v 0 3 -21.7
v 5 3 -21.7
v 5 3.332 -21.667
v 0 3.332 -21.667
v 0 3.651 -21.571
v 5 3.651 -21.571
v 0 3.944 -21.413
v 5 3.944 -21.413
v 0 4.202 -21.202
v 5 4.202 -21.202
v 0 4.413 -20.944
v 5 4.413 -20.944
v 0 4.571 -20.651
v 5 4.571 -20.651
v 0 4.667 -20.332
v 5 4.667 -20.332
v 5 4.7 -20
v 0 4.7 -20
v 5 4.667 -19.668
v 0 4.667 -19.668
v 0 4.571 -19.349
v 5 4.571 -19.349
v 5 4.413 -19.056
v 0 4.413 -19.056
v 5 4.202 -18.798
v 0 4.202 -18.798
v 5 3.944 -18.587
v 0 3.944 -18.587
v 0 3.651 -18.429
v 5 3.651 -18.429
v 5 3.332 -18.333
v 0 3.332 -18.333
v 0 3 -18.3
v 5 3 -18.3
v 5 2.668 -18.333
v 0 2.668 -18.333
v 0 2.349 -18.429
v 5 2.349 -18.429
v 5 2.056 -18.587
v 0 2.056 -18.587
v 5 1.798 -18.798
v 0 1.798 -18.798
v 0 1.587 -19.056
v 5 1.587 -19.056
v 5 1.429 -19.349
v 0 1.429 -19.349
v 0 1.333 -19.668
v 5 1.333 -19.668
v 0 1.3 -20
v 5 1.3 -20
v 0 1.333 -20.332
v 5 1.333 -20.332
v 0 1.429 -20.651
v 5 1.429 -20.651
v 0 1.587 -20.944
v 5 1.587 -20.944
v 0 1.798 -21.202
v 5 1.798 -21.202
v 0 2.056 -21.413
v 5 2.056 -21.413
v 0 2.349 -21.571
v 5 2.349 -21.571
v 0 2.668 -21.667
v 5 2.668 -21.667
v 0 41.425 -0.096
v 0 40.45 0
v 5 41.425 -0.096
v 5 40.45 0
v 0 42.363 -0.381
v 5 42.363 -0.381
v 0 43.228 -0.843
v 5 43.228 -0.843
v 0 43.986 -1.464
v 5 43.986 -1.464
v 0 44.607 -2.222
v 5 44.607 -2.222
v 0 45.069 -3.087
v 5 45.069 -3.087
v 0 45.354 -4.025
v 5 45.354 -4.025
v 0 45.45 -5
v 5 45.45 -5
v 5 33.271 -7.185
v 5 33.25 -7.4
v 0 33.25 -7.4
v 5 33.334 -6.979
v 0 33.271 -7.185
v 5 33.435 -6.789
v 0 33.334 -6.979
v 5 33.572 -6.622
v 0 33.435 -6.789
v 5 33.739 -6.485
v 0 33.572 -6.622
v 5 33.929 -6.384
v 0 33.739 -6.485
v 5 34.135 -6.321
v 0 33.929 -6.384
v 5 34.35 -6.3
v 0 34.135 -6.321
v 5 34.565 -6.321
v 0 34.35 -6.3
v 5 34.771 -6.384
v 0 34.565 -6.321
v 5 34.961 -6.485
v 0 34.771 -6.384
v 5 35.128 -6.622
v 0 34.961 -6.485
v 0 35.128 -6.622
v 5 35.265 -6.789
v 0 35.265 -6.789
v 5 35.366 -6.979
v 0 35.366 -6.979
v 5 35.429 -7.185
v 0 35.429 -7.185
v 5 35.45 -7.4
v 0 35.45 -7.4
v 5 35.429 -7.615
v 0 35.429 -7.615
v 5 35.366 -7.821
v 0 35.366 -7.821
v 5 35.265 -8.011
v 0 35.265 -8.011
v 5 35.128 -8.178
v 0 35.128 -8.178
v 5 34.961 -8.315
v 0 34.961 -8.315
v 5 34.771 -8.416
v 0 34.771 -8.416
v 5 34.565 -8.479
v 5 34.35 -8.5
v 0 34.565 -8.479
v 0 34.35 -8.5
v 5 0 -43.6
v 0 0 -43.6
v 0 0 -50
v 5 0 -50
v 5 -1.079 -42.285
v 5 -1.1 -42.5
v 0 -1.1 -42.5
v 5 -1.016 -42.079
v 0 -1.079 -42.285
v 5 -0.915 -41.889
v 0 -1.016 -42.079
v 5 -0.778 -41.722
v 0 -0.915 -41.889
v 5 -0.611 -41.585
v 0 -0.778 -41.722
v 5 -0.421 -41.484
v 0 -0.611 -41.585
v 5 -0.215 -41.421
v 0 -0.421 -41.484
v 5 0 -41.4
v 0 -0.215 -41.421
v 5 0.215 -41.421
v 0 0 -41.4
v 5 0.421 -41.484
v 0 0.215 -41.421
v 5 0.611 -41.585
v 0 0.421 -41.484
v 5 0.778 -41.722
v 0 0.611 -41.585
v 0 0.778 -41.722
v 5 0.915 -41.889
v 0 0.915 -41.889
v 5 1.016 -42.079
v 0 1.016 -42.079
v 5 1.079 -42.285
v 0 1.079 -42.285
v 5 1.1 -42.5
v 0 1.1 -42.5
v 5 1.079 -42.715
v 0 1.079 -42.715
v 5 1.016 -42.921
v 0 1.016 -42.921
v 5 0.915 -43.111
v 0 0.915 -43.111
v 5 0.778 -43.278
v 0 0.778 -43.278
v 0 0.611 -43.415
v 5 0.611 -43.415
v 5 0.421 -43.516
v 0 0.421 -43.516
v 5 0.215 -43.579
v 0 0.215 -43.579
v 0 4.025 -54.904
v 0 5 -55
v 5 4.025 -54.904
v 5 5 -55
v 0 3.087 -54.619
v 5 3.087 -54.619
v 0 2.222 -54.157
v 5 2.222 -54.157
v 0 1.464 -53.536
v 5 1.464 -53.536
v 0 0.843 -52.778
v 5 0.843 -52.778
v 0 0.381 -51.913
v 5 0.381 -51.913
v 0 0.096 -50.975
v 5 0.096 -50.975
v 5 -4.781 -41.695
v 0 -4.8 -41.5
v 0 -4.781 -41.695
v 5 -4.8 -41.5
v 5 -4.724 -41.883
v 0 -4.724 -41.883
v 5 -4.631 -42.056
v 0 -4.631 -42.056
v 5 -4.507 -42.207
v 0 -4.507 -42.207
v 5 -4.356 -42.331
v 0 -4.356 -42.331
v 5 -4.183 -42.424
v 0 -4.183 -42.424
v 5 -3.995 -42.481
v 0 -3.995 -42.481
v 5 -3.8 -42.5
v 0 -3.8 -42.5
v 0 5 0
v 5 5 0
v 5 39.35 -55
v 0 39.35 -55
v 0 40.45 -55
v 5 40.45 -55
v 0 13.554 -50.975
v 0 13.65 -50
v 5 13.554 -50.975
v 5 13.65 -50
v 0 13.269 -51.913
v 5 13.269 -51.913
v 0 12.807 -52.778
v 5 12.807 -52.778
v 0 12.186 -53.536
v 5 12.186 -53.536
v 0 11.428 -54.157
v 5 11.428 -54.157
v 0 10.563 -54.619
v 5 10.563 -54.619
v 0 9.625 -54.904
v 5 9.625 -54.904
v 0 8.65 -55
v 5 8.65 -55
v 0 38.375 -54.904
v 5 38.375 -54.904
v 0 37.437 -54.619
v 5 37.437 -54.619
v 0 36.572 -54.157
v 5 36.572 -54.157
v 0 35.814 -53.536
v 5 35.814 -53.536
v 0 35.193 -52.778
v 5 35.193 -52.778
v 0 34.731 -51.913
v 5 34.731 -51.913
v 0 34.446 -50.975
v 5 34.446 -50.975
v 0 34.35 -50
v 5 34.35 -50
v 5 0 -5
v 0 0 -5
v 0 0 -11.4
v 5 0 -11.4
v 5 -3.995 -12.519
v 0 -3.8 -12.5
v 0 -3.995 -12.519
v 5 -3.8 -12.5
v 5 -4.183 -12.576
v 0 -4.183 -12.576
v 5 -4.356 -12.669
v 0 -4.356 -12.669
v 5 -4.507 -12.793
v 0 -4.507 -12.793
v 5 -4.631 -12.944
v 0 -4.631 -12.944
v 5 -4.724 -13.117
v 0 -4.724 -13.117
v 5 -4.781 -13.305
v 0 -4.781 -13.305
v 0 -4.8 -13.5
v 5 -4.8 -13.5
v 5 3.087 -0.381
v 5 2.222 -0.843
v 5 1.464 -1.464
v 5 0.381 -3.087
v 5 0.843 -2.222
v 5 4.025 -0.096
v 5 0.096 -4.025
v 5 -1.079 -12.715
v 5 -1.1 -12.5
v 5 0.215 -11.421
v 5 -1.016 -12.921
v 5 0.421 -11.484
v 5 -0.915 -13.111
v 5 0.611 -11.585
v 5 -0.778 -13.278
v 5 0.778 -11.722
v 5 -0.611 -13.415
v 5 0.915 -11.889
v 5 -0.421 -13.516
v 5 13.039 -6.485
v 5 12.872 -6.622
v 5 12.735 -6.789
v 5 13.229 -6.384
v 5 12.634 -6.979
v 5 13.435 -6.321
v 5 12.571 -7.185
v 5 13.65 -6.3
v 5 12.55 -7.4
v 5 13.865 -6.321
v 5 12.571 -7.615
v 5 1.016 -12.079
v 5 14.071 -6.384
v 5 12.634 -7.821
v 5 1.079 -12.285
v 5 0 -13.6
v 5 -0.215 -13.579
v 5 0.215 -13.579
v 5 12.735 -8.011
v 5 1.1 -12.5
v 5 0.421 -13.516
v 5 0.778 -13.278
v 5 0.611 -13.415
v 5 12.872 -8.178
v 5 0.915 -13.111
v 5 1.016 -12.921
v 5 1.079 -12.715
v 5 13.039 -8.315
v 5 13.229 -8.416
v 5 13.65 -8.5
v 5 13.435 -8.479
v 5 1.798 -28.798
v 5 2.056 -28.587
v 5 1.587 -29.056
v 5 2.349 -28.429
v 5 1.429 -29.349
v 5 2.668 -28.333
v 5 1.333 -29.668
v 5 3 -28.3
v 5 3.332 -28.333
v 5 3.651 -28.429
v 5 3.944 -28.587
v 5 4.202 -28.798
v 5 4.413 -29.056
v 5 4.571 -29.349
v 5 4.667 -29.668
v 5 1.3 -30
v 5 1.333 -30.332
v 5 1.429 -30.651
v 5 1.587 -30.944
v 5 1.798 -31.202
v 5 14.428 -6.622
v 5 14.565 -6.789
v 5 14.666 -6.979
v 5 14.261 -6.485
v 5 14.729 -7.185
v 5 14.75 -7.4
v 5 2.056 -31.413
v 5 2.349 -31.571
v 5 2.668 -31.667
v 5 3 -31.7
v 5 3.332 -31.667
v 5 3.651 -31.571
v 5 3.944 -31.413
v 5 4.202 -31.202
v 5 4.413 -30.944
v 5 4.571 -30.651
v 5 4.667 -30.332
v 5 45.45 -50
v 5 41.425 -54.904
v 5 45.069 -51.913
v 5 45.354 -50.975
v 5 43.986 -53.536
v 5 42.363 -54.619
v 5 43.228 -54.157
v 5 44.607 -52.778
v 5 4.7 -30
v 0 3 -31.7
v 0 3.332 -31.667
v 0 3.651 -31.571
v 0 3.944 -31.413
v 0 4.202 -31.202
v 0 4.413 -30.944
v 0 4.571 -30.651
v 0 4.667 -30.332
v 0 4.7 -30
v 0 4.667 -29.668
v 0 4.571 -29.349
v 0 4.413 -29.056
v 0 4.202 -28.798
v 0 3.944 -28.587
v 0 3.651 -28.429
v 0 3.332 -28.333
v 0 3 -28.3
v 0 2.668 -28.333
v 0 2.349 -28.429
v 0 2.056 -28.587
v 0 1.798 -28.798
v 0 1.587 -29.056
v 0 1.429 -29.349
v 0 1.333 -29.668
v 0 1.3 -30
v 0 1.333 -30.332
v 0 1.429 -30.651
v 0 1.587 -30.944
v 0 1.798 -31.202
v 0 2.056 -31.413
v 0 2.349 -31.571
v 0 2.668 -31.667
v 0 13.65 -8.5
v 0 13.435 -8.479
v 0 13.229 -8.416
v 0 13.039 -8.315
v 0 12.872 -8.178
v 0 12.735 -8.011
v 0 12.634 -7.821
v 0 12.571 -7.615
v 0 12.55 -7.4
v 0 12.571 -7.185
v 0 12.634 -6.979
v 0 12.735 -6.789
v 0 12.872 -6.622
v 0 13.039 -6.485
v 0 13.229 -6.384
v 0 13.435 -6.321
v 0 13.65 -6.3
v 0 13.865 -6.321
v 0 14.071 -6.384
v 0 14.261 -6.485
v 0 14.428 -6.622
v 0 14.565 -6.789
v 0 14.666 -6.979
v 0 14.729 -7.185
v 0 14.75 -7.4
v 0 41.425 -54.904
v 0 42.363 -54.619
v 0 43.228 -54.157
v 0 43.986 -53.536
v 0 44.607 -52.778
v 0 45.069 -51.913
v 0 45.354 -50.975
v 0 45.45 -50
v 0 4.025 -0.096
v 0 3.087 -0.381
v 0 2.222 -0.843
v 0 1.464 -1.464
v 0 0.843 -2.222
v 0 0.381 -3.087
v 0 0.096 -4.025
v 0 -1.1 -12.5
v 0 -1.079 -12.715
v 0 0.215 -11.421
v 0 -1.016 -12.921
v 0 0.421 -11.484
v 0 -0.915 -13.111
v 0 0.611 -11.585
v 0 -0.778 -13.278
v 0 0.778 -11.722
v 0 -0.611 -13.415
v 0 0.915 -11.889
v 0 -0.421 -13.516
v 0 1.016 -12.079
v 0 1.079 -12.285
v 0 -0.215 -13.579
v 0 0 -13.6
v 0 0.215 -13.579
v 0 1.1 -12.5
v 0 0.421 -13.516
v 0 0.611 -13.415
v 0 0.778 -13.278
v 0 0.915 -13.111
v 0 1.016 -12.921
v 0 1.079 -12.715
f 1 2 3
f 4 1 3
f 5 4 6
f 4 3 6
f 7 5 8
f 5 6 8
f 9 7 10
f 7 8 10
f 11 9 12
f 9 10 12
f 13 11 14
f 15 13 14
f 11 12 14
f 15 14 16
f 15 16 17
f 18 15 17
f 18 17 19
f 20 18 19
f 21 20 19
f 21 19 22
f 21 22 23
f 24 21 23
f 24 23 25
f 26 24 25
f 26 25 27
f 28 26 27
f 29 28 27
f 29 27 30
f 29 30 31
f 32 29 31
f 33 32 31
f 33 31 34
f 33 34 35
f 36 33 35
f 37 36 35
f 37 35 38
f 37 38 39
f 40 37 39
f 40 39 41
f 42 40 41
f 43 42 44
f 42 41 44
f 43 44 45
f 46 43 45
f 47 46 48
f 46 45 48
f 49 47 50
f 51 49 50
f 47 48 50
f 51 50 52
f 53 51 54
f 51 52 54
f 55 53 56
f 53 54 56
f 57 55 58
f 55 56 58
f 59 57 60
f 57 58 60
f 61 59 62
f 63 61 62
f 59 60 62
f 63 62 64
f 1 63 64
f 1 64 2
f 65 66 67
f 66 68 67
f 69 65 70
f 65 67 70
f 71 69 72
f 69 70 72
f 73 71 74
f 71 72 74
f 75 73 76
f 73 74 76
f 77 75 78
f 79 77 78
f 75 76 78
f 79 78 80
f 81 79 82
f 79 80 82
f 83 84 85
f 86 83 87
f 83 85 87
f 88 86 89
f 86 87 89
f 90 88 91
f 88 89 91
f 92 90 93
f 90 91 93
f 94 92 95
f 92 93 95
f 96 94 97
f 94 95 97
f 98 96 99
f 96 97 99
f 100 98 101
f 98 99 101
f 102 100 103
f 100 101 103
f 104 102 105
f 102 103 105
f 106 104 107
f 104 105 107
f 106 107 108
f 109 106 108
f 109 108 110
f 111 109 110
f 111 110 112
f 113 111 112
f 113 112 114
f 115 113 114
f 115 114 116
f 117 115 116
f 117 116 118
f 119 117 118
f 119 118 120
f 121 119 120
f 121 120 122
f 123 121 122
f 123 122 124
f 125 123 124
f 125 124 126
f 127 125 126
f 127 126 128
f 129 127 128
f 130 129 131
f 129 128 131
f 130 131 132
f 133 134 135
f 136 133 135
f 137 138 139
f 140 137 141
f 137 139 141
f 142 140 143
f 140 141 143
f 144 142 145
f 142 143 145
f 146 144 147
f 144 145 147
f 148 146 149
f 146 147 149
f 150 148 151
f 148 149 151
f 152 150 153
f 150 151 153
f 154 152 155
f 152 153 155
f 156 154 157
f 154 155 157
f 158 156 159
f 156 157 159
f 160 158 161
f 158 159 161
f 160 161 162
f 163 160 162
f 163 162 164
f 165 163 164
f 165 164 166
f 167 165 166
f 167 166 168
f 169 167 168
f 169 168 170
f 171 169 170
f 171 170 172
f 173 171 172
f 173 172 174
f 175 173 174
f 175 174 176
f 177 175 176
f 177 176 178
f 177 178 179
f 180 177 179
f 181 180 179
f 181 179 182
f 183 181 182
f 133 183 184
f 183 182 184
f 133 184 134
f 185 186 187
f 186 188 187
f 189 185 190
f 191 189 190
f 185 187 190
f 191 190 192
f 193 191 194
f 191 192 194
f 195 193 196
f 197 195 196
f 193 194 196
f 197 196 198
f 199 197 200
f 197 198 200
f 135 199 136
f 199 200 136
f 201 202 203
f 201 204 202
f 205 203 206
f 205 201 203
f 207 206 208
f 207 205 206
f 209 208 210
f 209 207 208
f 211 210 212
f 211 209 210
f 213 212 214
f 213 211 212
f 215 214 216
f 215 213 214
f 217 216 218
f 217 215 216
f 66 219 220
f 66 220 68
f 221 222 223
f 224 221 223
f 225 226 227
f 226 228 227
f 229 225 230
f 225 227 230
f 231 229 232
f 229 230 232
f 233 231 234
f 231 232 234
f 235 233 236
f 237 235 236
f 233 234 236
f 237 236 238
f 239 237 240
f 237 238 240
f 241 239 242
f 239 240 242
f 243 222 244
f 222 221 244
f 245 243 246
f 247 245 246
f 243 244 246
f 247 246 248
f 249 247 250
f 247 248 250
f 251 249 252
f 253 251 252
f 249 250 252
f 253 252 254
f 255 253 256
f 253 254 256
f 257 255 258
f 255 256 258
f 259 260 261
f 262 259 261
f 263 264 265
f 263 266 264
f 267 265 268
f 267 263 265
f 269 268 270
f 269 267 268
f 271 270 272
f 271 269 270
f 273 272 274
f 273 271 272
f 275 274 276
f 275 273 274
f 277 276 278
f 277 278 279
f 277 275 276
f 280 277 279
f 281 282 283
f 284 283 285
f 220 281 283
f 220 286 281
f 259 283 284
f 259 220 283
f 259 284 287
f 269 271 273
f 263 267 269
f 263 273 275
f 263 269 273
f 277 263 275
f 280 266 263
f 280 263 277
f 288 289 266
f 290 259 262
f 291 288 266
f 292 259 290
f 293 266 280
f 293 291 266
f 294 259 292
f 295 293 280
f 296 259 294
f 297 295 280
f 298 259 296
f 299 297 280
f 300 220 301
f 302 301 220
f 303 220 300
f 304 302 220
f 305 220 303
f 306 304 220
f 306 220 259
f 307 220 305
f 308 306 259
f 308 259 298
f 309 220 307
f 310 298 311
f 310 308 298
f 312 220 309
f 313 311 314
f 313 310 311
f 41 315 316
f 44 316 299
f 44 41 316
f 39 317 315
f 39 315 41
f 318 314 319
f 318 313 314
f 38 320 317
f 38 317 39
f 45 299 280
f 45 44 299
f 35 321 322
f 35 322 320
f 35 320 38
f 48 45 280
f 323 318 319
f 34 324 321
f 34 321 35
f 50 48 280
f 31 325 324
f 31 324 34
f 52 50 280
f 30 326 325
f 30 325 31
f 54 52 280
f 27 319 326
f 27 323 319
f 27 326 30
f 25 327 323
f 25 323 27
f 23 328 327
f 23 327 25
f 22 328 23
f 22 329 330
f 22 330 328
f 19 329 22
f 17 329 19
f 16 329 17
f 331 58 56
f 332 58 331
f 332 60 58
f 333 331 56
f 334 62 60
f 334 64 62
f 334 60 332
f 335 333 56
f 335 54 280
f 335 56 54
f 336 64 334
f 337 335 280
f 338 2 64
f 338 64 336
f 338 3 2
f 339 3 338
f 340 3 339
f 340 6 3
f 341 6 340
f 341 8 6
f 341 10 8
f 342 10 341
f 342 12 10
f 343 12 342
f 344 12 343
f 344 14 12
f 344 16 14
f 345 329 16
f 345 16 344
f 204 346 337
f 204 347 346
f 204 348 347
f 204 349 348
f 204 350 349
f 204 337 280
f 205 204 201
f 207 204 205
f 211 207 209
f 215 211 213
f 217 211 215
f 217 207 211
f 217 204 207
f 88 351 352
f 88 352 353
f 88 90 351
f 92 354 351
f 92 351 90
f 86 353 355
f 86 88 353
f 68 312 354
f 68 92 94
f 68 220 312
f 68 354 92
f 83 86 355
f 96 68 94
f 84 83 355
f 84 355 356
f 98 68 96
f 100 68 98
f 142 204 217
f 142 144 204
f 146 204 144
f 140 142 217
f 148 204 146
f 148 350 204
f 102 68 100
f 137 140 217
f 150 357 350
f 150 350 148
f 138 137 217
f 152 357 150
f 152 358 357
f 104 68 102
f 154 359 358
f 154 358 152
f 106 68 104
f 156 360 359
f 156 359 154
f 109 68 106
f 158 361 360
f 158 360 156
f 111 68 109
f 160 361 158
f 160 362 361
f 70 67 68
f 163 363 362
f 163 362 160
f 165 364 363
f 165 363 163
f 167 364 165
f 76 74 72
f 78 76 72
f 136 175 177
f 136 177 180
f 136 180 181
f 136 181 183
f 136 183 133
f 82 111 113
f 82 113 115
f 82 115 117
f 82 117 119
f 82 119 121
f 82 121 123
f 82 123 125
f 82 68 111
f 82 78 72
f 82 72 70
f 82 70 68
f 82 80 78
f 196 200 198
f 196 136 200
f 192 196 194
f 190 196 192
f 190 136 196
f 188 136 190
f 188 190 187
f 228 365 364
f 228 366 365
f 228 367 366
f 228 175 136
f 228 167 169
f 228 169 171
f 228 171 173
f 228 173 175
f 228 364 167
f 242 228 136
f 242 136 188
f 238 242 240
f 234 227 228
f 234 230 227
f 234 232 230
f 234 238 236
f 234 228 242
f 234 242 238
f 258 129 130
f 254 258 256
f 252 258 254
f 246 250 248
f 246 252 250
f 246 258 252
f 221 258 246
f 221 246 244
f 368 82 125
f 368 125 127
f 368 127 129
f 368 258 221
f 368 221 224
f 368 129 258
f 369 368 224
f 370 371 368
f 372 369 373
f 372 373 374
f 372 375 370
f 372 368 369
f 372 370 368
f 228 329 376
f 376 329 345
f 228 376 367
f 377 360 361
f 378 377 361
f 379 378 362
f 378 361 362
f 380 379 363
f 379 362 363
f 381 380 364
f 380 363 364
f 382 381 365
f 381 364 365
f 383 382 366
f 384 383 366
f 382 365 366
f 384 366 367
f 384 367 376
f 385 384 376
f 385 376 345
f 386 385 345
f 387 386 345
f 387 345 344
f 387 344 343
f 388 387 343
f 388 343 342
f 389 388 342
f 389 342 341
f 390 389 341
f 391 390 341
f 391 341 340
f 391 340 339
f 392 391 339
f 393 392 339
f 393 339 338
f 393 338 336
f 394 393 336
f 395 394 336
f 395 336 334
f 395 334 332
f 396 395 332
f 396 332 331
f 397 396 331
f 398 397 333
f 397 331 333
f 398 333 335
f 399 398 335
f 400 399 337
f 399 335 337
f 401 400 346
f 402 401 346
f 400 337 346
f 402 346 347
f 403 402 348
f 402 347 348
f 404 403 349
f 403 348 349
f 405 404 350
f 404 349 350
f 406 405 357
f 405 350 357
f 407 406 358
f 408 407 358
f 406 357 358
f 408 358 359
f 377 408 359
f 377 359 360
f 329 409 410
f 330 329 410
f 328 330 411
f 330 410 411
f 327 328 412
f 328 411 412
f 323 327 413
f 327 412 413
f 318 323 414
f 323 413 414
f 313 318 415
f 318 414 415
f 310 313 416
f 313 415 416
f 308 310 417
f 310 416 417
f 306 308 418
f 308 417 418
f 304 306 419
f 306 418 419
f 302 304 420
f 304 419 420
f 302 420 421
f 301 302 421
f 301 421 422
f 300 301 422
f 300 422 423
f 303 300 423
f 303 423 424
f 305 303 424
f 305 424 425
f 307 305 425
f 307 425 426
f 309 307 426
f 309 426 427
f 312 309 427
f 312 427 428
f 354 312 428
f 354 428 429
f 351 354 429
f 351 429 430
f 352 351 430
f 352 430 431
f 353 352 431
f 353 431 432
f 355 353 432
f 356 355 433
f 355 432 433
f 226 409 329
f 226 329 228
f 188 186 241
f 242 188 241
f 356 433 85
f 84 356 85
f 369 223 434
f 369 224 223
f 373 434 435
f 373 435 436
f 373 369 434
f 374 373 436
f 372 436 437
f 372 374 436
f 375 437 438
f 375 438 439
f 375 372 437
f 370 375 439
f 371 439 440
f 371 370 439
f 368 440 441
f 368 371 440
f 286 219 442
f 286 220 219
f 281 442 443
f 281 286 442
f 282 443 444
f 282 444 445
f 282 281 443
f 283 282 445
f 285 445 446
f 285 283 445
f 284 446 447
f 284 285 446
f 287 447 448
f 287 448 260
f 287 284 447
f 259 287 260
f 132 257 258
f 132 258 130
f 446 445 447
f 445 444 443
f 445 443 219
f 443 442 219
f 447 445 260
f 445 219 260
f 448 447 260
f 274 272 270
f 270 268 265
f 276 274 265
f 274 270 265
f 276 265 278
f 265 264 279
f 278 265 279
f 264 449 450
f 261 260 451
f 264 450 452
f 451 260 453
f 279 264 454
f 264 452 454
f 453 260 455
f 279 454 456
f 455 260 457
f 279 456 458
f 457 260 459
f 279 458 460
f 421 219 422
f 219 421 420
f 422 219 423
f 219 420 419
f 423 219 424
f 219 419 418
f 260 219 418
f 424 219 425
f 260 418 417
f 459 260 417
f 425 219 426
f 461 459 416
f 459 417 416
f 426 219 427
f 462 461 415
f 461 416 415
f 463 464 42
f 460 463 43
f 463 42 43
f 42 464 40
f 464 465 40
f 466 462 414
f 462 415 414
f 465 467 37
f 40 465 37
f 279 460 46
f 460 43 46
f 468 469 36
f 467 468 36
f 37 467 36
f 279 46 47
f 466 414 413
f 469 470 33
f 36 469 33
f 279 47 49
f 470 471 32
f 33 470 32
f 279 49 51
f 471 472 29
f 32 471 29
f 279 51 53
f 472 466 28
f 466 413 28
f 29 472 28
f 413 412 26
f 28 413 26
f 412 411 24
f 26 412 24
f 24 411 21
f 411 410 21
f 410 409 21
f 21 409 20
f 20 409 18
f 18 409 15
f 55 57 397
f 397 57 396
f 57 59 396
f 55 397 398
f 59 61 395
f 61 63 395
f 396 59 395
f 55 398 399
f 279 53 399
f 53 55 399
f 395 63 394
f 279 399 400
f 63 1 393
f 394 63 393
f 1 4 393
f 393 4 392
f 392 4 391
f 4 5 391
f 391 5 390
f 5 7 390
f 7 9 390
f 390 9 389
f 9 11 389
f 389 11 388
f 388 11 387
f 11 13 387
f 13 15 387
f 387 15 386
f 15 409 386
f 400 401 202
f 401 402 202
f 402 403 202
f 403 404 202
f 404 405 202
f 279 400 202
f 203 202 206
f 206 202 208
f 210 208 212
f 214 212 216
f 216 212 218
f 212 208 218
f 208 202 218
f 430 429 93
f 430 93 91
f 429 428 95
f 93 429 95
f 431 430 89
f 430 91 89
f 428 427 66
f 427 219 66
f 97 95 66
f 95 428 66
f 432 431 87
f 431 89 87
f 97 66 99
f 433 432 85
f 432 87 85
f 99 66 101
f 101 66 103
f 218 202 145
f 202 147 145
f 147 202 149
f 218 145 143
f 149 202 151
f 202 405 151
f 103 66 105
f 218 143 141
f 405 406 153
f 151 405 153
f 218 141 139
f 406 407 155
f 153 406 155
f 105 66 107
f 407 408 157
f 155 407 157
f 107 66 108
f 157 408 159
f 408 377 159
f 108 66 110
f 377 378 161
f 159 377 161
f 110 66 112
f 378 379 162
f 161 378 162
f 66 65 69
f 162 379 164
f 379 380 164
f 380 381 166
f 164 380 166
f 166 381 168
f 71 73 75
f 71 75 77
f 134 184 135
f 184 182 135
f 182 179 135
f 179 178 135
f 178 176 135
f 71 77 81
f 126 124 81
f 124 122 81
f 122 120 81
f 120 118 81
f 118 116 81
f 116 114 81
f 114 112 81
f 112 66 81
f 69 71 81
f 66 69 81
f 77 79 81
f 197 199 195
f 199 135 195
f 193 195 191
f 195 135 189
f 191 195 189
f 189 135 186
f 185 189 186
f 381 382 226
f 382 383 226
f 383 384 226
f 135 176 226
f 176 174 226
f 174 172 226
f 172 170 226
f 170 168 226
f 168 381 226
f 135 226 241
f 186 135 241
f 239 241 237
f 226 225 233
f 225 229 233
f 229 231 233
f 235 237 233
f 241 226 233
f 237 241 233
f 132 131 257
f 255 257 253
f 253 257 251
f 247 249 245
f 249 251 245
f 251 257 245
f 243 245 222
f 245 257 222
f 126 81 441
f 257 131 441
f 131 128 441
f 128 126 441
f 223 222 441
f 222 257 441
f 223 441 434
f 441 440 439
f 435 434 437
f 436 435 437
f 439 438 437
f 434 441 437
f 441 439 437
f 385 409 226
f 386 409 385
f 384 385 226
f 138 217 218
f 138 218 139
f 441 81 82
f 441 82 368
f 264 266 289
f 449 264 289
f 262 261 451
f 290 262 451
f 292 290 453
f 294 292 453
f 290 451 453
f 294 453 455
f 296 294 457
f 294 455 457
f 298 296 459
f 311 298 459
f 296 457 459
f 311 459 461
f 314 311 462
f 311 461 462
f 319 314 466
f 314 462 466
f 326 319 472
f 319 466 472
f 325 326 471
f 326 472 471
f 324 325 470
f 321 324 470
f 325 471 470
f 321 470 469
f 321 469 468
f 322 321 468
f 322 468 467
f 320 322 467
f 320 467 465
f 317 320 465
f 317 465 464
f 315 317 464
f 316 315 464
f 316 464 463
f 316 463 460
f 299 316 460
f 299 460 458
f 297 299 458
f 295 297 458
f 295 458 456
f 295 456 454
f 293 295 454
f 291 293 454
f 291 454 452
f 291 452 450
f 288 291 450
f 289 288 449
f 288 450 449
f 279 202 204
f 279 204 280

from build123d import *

# Parameters (mm, degrees)
SKETCH_1_W           = 55
SKETCH_1_H           = 45.45
SKETCH_1_W_2         = 40.2
SKETCH_1_H_2         = 20.7
EXTRUDE_1_DEPTH      = 5
SKETCH_2_W           = 30
SKETCH_2_H           = 4.8
EXTRUDE_2_DEPTH      = 5
SKETCH_3_R           = 1.1
CUT_EXTRUDE_1_DEPTH  = 5
FILLET_2_R           = 5
FILLET_3_R           = 1
M3_CLEARANCE_HOLE1_D = 3.4
SKETCH3_W            = 7.4
SKETCH3_H            = 20.7
CUT_EXTRUDE1_DEPTH   = 10
FILLET1_R            = 5


with BuildPart() as part:
    # 草图1 → 凸台-拉伸1 (new body)
    with BuildSketch(Plane(origin=(0, 0, 0), x_dir=(0, 0, -1), z_dir=(1, 0, 0))):
        with Locations((27.5, 22.725)):
            Rectangle(SKETCH_1_W, SKETCH_1_H)
        with Locations((27.5, 24)):
            Rectangle(SKETCH_1_W_2, SKETCH_1_H_2, mode=Mode.SUBTRACT)
    extrude(amount=EXTRUDE_1_DEPTH)

    # 草图2 → 凸台-拉伸2 (add)
    with BuildSketch(Plane.ZY):
        with Locations((-27.5, -2.4)):
            Rectangle(SKETCH_2_W, SKETCH_2_H)
    extrude(amount=-EXTRUDE_2_DEPTH)

    # 草图3 → 切除-拉伸1 (cut)
    with BuildSketch(Plane.ZY):
        with Locations((-42.5, 0)):
            Circle(SKETCH_3_R)
        with Locations((-12.5, 0)):
            Circle(SKETCH_3_R)
        with Locations((-7.4, 13.65)):
            Circle(SKETCH_3_R)
        with Locations((-7.4, 34.35)):
            Circle(SKETCH_3_R)
    extrude(amount=-CUT_EXTRUDE_1_DEPTH, mode=Mode.SUBTRACT)

    # 圆角2
    fillet_2_edges = [part.edges().sort_by_distance(p)[0] for p in [
        (2.5, 45.45, 0),
        (2.5, 45.45, -55),
        (2.5, 0, -55),
        (2.5, 0, 0),
    ]]
    fillet(fillet_2_edges, radius=FILLET_2_R)

    # 圆角3
    fillet_3_edges = [part.edges().sort_by_distance(p)[0] for p in [
        (2.5, -4.8, -42.5),
        (2.5, -4.8, -12.5),
    ]]
    fillet(fillet_3_edges, radius=FILLET_3_R)

    # M3 Clearance Hole1 (through all)
    with Locations(Plane.ZY):
        with Locations((-30, 3), (-20, 3)):
            Hole(M3_CLEARANCE_HOLE1_D / 2)

    # Sketch3 → Cut-Extrude1 (cut)
    with BuildSketch(Plane.ZY):
        with Locations((-51.3, 24)):
            Rectangle(SKETCH3_W, SKETCH3_H)
    extrude(amount=-CUT_EXTRUDE1_DEPTH, mode=Mode.SUBTRACT)

    # Fillet1
    fillet1_edges = [part.edges().sort_by_distance(p)[0] for p in [
        (2.5, 13.65, -55),
        (2.5, 34.35, -55),
    ]]
    fillet(fillet1_edges, radius=FILLET1_R)


solid = part.part
